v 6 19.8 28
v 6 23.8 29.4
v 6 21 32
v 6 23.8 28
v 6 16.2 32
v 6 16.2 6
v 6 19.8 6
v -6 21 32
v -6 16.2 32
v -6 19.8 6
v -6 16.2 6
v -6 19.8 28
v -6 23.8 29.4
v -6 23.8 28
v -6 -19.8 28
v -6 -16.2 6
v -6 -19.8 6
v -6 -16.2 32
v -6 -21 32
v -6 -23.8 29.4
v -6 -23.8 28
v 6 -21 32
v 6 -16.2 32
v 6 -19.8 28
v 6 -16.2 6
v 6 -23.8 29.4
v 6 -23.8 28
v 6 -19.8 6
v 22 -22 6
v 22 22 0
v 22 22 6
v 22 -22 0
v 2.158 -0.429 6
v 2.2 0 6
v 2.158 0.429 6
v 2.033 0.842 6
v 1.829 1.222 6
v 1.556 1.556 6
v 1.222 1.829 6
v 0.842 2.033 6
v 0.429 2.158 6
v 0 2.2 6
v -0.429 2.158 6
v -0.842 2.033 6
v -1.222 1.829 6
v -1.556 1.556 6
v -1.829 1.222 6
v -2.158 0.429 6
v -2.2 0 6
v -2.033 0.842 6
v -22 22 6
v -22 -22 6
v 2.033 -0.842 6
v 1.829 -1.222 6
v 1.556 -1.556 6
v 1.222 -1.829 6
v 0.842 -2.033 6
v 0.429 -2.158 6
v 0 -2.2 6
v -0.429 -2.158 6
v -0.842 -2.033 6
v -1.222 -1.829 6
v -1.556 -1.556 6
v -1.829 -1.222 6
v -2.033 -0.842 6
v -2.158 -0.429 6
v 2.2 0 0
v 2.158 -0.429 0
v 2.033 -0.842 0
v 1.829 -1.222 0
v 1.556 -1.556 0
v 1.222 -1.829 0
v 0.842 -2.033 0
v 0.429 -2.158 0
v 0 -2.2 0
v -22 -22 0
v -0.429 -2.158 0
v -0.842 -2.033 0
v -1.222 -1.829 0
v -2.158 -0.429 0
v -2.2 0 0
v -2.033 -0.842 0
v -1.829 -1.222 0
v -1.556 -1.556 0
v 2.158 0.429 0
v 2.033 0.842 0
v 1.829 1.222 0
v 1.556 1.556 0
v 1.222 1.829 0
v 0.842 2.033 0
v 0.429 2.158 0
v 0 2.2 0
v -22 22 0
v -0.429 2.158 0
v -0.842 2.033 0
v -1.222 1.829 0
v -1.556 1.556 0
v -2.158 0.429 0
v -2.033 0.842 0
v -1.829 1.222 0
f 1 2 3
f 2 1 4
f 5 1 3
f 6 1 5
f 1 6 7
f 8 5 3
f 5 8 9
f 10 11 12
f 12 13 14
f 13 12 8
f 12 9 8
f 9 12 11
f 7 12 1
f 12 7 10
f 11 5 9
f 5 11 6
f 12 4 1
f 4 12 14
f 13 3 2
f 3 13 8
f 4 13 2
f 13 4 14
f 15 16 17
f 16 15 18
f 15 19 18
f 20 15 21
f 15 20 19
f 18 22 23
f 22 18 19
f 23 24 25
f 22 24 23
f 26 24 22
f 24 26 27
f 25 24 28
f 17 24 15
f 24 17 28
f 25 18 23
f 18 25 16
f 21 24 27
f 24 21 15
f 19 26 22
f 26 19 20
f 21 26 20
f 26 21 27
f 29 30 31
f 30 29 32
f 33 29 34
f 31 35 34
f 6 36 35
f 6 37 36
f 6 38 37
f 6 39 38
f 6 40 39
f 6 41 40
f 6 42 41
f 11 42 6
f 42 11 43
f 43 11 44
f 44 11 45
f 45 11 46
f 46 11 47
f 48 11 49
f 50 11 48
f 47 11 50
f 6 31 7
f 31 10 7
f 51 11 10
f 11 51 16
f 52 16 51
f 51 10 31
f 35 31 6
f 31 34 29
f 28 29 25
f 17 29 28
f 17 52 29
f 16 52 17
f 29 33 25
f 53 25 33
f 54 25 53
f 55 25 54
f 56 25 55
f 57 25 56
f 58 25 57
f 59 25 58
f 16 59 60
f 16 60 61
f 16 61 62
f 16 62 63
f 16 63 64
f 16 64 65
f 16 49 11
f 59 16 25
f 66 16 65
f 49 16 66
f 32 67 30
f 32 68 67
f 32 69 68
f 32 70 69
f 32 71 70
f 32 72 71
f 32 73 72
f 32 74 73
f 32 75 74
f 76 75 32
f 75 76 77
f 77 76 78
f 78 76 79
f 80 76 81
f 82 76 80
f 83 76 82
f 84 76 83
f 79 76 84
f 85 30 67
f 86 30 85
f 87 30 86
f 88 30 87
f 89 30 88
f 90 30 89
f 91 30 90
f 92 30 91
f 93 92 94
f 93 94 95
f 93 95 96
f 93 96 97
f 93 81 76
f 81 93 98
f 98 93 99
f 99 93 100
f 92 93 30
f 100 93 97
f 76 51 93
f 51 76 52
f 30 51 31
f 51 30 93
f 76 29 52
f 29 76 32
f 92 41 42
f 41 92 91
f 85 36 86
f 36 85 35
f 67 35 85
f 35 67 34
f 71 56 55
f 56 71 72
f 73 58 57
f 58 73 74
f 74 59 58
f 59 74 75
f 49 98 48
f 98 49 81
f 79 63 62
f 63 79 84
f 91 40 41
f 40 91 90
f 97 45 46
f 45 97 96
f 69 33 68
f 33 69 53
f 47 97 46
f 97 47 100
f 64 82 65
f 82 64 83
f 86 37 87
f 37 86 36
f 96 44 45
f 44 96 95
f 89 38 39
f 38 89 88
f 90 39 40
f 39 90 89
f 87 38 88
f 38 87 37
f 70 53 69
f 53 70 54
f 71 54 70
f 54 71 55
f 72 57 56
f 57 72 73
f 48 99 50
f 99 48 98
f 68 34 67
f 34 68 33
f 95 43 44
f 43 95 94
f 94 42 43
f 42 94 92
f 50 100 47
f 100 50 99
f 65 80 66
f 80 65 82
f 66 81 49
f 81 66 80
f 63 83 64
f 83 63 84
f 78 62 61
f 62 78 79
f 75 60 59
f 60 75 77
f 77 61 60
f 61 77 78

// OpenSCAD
$fn = 32;

// ----------------------------------------------------------------------
// Snap-fit latch: 2 arms, 26 mm tall, 4.2 mm undercut hooks
// ----------------------------------------------------------------------

// --- parameters (mm) ---
base_d = 44;              // base plate depth
base_h = 6;               // base plate thickness
span = 36;                // distance between opposite arms
arm_t = 3.6;              // arm thickness
arm_d = 12;               // arm width
height = 26;              // free arm length
head_len = 4.2;           // hook reach
head_h = 4;               // hook height
lead = 1.4;               // lead-in ramp thickness
bore_d = 4.4;             // base fixing bore
top_z = 32;               // height of the arm tips above the base

arms = 2;

difference() {
  union() {
    /* base plate, centred on the arm ring */
    translate([-22, -22, 0]) cube([base_d, base_d, base_h]);
    for (a = [0 : 360 / arms : 359]) rotate([0, 0, a]) {
    /* arm, sunk 0.5 mm into the base */
    translate([-arm_d / 2, span / 2 - arm_t / 2, base_h - 0.5]) cube([arm_d, arm_t, height + 0.5]);
    /* hook: a convex hull of a tall inner block and a thin outer lip
       gives a flat undercut below and a lead-in ramp on top */
    hull() {
      translate([-arm_d / 2, span / 2 + arm_t / 2 - 0.6, top_z - head_h]) cube([arm_d, lead + 0.4, head_h]);
      translate([-arm_d / 2, span / 2 + arm_t / 2 - 0.2, top_z - head_h]) cube([arm_d, head_len, lead]);
    }
    }
  }
  translate([0, 0, -2.5]) cylinder(h = base_h + 5, d = bore_d);
}
